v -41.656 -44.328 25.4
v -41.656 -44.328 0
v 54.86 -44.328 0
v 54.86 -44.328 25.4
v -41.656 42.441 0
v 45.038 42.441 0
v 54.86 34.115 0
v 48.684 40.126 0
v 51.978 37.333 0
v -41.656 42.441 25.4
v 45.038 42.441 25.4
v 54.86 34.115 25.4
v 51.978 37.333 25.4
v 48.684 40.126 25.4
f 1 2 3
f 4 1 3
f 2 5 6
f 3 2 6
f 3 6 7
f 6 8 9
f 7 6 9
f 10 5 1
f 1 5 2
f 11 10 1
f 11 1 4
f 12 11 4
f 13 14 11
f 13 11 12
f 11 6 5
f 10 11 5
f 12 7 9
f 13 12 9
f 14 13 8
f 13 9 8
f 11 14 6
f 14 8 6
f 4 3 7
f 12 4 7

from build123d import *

# Parameters (mm, degrees)
F0_R     = 6.7719782622
F0_R_2   = 8.3533138705
F0_R_3   = 6.1041777079
F0_R_4   = 8.3887330486
F1_DEPTH = 25.4


with BuildPart() as f1:
    # F0 (on Top) → F1 (new body)
    with BuildSketch(Plane.XY):
        with BuildLine():
            Line((-32.8200038305, 42.44145751), (-41.6555032134, 42.44145751))
            Line((-41.6555032134, 42.44145751), (-41.6555032134, -44.3277396262))
            Line((-41.6555032134, -44.3277396262), (22.8379998192, -44.3277396262))
            ThreePointArc((22.8379998192, -44.3277396262), (20.9083950431, -42.8052736986), (19.896760613, -40.5652127903))
            ThreePointArc((19.896760613, -40.5652127903), (13.4825359621, -22.579296483), (30.9998358882, -30.1805902272))
            ThreePointArc((30.9998358882, -30.1805902272), (30.4866063296, -33.408568792), (28.9975340915, -36.3181931773))
            ThreePointArc((28.9975340915, -36.3181931773), (29.874119418, -37.8625041543), (30.1782038226, -39.6120272044))
            ThreePointArc((30.1782038226, -39.6120272044), (29.3555372579, -42.4145470817), (27.148595431, -44.3277396262))
            Line((27.148595431, -44.3277396262), (54.8595115542, -44.3277396262))
            Line((54.8595115542, -44.3277396262), (54.8595115542, -4.5629904419))
            ThreePointArc((54.8595115542, -4.5629904419), (6.013621036, -5.5798406926), (15.0086154157, 42.44145751))
            Line((15.0086154157, 42.44145751), (-17.7953552672, 42.44145751))
            ThreePointArc((-17.7953552672, 42.44145751), (-14.9723120672, 38.6078738284), (-13.9725065602, 33.9531637728))
            ThreePointArc((-13.9725065602, 33.9531637728), (-29.9623896044, 23.6177962912), (-32.8200038305, 42.44145751))
        make_face()
        with Locations((-27.5083519518, -21.0635364056)):
            Circle(F0_R, mode=Mode.SUBTRACT)
        with Locations((-6.7591932602, -11.9464835152)):
            Circle(F0_R_2, mode=Mode.SUBTRACT)
        with Locations((-14.6187227219, 17.9197248071)):
            Circle(F0_R_3, mode=Mode.SUBTRACT)
        with BuildLine():
            Line((-17.7953552672, 42.44145751), (-32.8200038305, 42.44145751))
            ThreePointArc((-32.8200038305, 42.44145751), (-29.9623896044, 23.6177962912), (-13.9725065602, 33.9531637728))
            ThreePointArc((-13.9725065602, 33.9531637728), (-14.9723120672, 38.6078738284), (-17.7953552672, 42.44145751))
        make_face()
        with Locations((-27.5083519518, -21.0635364056)):
            Circle(F0_R)
        with BuildLine():
            Line((45.0381728893, 42.44145751), (15.0086154157, 42.44145751))
            ThreePointArc((15.0086154157, 42.44145751), (6.013621036, -5.5798406926), (54.8595115542, -4.5629904419))
            Line((54.8595115542, -4.5629904419), (54.8595115542, 34.1148168594))
            ThreePointArc((54.8595115542, 34.1148168594), (50.3791480539, 38.7856863253), (45.0381728893, 42.44145751))
        make_face()
        with Locations((28.137113899, 22.949822247)):
            Circle(F0_R_4, mode=Mode.SUBTRACT)
        with Locations((28.137113899, 22.949822247)):
            Circle(F0_R_4)
        with BuildLine():
            ThreePointArc((30.9998358882, -30.1805902272), (13.4825359621, -22.579296483), (19.896760613, -40.5652127903))
            ThreePointArc((19.896760613, -40.5652127903), (22.800679551, -34.913551041), (28.9975340915, -36.3181931773))
            ThreePointArc((28.9975340915, -36.3181931773), (30.4866063296, -33.408568792), (30.9998358882, -30.1805902272))
        make_face()
        with BuildLine():
            ThreePointArc((19.896760613, -40.5652127903), (20.9083950431, -42.8052736986), (22.8379998192, -44.3277396262))
            Line((22.8379998192, -44.3277396262), (27.148595431, -44.3277396262))
            ThreePointArc((27.148595431, -44.3277396262), (29.3555372579, -42.4145470817), (30.1782038226, -39.6120272044))
            ThreePointArc((30.1782038226, -39.6120272044), (29.874119418, -37.8625041543), (28.9975340915, -36.3181931773))
            ThreePointArc((28.9975340915, -36.3181931773), (24.9932976251, -39.6120272044), (19.896760613, -40.5652127903))
        make_face()
        with Locations((-6.7591932602, -11.9464835152)):
            Circle(F0_R_2)
        with BuildLine():
            ThreePointArc((28.9975340915, -36.3181931773), (22.800679551, -34.913551041), (19.896760613, -40.5652127903))
            ThreePointArc((19.896760613, -40.5652127903), (24.9932976251, -39.6120272044), (28.9975340915, -36.3181931773))
        make_face()
        with Locations((-14.6187227219, 17.9197248071)):
            Circle(F0_R_3)
    extrude(amount=F1_DEPTH)


solid = f1.part
